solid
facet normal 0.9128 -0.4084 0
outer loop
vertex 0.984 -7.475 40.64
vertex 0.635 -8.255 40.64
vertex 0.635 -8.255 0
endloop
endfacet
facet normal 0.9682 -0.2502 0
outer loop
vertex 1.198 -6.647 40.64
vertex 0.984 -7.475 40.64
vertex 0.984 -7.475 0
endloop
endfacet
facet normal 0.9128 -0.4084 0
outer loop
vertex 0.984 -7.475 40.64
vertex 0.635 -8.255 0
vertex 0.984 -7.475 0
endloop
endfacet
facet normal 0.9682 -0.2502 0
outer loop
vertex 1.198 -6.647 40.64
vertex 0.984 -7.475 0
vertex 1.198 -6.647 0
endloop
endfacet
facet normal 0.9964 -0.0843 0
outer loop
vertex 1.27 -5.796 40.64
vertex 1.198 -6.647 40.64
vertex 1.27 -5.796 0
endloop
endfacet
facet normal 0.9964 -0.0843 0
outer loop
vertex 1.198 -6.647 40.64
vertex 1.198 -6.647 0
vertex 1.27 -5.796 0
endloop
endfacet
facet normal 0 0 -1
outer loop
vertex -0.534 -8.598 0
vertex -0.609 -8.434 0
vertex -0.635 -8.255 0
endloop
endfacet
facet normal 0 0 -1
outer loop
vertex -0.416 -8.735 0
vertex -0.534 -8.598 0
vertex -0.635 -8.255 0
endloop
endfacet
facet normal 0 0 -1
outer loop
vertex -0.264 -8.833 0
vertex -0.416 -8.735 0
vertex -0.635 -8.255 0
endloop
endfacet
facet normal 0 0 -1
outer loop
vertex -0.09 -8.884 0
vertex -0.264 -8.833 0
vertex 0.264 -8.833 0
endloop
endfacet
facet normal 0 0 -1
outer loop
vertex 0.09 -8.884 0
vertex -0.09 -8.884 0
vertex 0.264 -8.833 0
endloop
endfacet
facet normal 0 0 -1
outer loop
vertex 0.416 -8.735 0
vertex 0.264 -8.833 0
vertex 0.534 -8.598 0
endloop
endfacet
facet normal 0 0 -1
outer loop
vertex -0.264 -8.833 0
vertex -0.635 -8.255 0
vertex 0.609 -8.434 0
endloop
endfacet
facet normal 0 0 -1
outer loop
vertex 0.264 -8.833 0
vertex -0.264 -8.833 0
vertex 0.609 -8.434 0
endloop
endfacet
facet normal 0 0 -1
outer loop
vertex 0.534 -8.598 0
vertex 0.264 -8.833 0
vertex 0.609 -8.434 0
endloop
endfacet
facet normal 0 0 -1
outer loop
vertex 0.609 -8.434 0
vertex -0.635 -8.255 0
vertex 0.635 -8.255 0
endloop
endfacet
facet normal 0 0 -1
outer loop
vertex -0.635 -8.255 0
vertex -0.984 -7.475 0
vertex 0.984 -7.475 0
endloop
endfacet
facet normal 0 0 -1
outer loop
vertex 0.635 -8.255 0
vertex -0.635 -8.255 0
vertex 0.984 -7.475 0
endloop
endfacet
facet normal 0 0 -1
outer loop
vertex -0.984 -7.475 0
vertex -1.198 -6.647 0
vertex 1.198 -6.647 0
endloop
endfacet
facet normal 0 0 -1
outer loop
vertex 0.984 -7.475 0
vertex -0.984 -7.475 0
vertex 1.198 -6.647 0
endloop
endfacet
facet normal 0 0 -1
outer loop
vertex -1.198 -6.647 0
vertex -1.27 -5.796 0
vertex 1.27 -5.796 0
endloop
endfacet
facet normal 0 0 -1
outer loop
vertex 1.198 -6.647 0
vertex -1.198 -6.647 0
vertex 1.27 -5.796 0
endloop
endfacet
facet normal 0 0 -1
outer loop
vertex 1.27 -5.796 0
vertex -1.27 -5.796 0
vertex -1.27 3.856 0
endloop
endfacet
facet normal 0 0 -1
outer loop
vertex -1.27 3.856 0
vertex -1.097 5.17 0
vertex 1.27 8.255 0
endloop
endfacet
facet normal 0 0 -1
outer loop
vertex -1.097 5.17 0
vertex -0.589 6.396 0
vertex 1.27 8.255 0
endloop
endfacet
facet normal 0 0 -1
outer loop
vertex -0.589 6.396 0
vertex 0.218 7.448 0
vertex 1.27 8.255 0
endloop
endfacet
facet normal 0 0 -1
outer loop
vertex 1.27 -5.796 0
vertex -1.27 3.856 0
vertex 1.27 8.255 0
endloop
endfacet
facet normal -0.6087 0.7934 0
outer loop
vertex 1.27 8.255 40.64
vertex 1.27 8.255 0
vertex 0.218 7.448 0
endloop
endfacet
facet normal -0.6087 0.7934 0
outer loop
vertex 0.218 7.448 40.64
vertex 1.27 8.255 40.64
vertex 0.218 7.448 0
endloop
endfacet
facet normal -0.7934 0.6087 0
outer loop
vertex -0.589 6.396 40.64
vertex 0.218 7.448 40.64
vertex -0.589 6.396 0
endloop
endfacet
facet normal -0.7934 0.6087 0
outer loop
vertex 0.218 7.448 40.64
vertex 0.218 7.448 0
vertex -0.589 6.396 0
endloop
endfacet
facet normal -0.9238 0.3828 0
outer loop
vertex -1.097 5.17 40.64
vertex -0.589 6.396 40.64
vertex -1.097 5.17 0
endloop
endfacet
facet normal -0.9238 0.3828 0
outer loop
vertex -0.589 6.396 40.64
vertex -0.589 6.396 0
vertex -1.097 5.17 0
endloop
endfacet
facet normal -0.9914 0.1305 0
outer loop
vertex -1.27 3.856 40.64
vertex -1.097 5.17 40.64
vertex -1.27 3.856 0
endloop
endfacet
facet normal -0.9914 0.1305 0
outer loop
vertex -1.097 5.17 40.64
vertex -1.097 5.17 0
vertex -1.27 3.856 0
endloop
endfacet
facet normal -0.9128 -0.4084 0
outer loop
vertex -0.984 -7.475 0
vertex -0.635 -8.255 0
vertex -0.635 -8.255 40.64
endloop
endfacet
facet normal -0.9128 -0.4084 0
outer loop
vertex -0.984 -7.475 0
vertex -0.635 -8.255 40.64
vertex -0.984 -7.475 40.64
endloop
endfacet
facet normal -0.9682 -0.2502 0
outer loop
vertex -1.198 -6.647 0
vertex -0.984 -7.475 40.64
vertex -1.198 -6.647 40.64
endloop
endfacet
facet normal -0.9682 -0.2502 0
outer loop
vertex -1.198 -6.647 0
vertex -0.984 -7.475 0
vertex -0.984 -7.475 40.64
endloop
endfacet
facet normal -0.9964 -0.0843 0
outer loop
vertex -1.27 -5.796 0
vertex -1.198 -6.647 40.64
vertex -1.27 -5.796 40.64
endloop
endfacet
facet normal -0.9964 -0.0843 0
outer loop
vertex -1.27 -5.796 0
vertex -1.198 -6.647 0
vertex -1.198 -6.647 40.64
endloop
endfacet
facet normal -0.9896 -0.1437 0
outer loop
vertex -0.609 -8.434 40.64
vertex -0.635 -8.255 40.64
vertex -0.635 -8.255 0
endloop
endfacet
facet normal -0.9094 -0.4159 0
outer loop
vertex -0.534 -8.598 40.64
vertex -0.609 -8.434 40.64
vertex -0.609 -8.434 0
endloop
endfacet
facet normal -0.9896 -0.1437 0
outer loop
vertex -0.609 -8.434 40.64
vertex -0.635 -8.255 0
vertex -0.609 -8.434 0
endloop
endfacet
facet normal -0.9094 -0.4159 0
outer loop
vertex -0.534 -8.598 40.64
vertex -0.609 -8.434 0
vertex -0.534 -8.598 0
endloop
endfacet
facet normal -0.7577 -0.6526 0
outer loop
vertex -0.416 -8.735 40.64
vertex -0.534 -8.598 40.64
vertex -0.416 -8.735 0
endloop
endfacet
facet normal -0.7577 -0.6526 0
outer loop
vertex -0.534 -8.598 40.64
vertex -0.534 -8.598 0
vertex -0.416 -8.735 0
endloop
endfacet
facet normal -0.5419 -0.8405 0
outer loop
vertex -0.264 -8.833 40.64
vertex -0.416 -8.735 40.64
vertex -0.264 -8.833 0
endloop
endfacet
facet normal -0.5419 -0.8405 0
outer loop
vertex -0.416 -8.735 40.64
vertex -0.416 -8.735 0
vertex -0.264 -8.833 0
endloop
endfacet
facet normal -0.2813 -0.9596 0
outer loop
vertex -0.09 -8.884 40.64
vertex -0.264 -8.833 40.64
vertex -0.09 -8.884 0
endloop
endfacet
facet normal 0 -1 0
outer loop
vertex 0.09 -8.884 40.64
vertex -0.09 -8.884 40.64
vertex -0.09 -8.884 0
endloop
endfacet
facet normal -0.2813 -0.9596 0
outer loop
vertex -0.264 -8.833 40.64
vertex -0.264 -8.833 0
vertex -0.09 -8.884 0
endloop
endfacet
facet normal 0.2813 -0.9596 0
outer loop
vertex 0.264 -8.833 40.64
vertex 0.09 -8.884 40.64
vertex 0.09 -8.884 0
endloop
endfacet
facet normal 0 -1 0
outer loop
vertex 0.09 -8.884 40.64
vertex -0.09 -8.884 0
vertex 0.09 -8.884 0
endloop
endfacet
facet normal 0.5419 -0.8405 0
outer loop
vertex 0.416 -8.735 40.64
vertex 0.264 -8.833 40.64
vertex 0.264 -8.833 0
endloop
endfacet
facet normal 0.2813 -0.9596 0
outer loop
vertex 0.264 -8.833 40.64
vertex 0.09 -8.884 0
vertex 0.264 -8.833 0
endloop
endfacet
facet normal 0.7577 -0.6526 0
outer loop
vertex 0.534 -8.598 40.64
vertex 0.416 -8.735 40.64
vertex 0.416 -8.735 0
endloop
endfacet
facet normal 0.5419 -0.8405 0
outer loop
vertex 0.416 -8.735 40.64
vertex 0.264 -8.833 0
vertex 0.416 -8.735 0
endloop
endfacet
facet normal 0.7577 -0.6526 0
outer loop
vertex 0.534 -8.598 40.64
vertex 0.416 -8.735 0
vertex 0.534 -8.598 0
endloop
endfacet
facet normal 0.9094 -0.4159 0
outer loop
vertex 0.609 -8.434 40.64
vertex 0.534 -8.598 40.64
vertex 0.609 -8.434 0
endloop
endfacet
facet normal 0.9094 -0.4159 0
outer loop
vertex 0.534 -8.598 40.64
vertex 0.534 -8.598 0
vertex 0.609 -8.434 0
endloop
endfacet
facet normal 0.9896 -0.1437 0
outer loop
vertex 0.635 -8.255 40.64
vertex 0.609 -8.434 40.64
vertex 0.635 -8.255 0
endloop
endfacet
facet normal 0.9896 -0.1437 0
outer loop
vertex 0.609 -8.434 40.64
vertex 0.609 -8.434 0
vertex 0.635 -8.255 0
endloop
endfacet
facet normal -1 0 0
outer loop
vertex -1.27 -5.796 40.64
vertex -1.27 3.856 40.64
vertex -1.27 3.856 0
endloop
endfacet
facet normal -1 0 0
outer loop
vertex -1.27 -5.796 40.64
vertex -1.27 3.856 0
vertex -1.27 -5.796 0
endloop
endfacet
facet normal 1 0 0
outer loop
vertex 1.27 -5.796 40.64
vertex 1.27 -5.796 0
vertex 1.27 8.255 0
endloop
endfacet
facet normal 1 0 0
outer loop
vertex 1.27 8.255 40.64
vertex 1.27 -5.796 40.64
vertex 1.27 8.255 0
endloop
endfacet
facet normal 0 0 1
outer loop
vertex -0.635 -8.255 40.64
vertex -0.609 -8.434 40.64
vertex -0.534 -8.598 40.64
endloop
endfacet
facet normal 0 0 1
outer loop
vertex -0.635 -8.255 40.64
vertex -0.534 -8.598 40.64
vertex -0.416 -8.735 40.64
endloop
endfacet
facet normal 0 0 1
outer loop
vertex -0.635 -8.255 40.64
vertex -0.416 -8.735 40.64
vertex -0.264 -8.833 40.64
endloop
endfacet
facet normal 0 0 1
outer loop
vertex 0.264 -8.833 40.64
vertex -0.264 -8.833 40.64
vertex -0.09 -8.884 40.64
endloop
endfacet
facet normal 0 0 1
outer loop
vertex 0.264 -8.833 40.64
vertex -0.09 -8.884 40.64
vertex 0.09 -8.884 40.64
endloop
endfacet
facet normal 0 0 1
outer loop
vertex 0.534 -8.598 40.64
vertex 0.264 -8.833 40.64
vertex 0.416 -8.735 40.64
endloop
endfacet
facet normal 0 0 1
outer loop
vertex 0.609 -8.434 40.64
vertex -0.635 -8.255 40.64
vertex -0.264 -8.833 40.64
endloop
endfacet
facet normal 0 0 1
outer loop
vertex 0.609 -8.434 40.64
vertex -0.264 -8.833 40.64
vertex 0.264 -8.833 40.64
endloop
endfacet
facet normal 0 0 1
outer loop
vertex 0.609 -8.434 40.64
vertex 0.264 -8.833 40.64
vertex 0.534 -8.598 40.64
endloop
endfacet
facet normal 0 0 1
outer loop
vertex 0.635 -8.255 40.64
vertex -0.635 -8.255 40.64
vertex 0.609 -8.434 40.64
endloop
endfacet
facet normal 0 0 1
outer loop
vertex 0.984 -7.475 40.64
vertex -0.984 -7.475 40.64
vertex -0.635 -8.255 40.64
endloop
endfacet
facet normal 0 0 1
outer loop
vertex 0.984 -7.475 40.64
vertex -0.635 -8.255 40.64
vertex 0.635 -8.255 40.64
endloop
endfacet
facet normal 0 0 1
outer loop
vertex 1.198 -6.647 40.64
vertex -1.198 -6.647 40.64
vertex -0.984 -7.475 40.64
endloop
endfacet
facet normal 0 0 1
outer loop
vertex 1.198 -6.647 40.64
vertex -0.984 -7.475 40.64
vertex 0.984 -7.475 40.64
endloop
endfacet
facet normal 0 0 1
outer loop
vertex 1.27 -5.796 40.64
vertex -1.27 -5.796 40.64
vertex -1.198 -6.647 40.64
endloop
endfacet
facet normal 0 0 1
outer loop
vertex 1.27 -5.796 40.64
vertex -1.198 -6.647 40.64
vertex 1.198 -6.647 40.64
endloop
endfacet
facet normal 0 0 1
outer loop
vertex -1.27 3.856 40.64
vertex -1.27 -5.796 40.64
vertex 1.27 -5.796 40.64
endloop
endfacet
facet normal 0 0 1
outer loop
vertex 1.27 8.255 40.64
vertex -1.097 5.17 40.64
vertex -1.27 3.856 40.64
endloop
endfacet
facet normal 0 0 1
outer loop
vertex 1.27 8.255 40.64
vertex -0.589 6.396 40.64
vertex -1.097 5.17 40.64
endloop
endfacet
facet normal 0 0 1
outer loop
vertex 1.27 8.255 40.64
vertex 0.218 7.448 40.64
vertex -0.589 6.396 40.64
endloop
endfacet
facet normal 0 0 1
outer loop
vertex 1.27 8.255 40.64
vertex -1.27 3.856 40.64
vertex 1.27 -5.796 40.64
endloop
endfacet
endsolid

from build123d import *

# Parameters (mm, degrees)
F1_DEPTH    = 40.64
F2_T1_DEPTH = 62.6370452561
F3_T1_DEPTH = 52.9367221242


# Not quite as in the source:
# - a fillet or chamfer that OpenCascade refuses, or shapes differently, is made with other operations: its cross-section is extruded or revolved along the edge and cut away or added


with BuildPart() as f1:
    # F0 (on Top) → F1 (new body)
    with BuildSketch(Plane.XY):
        with BuildLine():
            Line((0.635, -8.255), (1.27, -8.255))
            Line((1.27, -8.255), (1.27, 8.255))
            Line((1.27, 8.255), (-1.27, 8.255))
            Line((-1.27, 8.255), (-1.27, -8.255))
            Line((-1.27, -8.255), (-0.635, -8.255))
            ThreePointArc((-0.635, -8.255), (0, -7.62), (0.635, -8.255))
        make_face()
        with BuildLine():
            ThreePointArc((-0.635, -8.255), (0, -8.89), (0.635, -8.255))
            Line((0.635, -8.255), (-0.635, -8.255))
        make_face()
        with BuildLine():
            Line((-0.635, -8.255), (0.635, -8.255))
            ThreePointArc((0.635, -8.255), (0, -7.62), (-0.635, -8.255))
        make_face()
    extrude(amount=F1_DEPTH)

    # F2: fillet of radius 5.08 on 1 edges, made by hand

    # F2_s2 → F2_t1 (cut)
    with BuildSketch(Plane.XY.offset(-10.9985226281)):
        with BuildLine():
            ThreePointArc((1.27, 8.255), (-0.5894090512, 6.3955909488), (-1.27, 3.8555909488))
            Line((-1.27, 3.8555909488), (-1.27, 8.255))
            Line((-1.27, 8.255), (1.27, 8.255))
        make_face()
    extrude(amount=F2_T1_DEPTH, mode=Mode.SUBTRACT)

    # F3: fillet of radius 5.08 on 2 edges, made by hand

    # F3_s2 → F3_t1 (cut)
    with BuildSketch(Plane.XY.offset(-6.1483610621)):
        with BuildLine():
            ThreePointArc((-0.635, -8.255), (-1.1086888497, -7.0656555752), (-1.27, -5.7956555752))
            Line((-1.27, -5.7956555752), (-1.27, -8.255))
            Line((-1.27, -8.255), (-0.635, -8.255))
        make_face()
        with BuildLine():
            ThreePointArc((0.635, -8.255), (1.1086888497, -7.0656555752), (1.27, -5.7956555752))
            Line((1.27, -5.7956555752), (1.27, -8.255))
            Line((1.27, -8.255), (0.635, -8.255))
        make_face()
    extrude(amount=F3_T1_DEPTH, mode=Mode.SUBTRACT)


solid = f1.part
